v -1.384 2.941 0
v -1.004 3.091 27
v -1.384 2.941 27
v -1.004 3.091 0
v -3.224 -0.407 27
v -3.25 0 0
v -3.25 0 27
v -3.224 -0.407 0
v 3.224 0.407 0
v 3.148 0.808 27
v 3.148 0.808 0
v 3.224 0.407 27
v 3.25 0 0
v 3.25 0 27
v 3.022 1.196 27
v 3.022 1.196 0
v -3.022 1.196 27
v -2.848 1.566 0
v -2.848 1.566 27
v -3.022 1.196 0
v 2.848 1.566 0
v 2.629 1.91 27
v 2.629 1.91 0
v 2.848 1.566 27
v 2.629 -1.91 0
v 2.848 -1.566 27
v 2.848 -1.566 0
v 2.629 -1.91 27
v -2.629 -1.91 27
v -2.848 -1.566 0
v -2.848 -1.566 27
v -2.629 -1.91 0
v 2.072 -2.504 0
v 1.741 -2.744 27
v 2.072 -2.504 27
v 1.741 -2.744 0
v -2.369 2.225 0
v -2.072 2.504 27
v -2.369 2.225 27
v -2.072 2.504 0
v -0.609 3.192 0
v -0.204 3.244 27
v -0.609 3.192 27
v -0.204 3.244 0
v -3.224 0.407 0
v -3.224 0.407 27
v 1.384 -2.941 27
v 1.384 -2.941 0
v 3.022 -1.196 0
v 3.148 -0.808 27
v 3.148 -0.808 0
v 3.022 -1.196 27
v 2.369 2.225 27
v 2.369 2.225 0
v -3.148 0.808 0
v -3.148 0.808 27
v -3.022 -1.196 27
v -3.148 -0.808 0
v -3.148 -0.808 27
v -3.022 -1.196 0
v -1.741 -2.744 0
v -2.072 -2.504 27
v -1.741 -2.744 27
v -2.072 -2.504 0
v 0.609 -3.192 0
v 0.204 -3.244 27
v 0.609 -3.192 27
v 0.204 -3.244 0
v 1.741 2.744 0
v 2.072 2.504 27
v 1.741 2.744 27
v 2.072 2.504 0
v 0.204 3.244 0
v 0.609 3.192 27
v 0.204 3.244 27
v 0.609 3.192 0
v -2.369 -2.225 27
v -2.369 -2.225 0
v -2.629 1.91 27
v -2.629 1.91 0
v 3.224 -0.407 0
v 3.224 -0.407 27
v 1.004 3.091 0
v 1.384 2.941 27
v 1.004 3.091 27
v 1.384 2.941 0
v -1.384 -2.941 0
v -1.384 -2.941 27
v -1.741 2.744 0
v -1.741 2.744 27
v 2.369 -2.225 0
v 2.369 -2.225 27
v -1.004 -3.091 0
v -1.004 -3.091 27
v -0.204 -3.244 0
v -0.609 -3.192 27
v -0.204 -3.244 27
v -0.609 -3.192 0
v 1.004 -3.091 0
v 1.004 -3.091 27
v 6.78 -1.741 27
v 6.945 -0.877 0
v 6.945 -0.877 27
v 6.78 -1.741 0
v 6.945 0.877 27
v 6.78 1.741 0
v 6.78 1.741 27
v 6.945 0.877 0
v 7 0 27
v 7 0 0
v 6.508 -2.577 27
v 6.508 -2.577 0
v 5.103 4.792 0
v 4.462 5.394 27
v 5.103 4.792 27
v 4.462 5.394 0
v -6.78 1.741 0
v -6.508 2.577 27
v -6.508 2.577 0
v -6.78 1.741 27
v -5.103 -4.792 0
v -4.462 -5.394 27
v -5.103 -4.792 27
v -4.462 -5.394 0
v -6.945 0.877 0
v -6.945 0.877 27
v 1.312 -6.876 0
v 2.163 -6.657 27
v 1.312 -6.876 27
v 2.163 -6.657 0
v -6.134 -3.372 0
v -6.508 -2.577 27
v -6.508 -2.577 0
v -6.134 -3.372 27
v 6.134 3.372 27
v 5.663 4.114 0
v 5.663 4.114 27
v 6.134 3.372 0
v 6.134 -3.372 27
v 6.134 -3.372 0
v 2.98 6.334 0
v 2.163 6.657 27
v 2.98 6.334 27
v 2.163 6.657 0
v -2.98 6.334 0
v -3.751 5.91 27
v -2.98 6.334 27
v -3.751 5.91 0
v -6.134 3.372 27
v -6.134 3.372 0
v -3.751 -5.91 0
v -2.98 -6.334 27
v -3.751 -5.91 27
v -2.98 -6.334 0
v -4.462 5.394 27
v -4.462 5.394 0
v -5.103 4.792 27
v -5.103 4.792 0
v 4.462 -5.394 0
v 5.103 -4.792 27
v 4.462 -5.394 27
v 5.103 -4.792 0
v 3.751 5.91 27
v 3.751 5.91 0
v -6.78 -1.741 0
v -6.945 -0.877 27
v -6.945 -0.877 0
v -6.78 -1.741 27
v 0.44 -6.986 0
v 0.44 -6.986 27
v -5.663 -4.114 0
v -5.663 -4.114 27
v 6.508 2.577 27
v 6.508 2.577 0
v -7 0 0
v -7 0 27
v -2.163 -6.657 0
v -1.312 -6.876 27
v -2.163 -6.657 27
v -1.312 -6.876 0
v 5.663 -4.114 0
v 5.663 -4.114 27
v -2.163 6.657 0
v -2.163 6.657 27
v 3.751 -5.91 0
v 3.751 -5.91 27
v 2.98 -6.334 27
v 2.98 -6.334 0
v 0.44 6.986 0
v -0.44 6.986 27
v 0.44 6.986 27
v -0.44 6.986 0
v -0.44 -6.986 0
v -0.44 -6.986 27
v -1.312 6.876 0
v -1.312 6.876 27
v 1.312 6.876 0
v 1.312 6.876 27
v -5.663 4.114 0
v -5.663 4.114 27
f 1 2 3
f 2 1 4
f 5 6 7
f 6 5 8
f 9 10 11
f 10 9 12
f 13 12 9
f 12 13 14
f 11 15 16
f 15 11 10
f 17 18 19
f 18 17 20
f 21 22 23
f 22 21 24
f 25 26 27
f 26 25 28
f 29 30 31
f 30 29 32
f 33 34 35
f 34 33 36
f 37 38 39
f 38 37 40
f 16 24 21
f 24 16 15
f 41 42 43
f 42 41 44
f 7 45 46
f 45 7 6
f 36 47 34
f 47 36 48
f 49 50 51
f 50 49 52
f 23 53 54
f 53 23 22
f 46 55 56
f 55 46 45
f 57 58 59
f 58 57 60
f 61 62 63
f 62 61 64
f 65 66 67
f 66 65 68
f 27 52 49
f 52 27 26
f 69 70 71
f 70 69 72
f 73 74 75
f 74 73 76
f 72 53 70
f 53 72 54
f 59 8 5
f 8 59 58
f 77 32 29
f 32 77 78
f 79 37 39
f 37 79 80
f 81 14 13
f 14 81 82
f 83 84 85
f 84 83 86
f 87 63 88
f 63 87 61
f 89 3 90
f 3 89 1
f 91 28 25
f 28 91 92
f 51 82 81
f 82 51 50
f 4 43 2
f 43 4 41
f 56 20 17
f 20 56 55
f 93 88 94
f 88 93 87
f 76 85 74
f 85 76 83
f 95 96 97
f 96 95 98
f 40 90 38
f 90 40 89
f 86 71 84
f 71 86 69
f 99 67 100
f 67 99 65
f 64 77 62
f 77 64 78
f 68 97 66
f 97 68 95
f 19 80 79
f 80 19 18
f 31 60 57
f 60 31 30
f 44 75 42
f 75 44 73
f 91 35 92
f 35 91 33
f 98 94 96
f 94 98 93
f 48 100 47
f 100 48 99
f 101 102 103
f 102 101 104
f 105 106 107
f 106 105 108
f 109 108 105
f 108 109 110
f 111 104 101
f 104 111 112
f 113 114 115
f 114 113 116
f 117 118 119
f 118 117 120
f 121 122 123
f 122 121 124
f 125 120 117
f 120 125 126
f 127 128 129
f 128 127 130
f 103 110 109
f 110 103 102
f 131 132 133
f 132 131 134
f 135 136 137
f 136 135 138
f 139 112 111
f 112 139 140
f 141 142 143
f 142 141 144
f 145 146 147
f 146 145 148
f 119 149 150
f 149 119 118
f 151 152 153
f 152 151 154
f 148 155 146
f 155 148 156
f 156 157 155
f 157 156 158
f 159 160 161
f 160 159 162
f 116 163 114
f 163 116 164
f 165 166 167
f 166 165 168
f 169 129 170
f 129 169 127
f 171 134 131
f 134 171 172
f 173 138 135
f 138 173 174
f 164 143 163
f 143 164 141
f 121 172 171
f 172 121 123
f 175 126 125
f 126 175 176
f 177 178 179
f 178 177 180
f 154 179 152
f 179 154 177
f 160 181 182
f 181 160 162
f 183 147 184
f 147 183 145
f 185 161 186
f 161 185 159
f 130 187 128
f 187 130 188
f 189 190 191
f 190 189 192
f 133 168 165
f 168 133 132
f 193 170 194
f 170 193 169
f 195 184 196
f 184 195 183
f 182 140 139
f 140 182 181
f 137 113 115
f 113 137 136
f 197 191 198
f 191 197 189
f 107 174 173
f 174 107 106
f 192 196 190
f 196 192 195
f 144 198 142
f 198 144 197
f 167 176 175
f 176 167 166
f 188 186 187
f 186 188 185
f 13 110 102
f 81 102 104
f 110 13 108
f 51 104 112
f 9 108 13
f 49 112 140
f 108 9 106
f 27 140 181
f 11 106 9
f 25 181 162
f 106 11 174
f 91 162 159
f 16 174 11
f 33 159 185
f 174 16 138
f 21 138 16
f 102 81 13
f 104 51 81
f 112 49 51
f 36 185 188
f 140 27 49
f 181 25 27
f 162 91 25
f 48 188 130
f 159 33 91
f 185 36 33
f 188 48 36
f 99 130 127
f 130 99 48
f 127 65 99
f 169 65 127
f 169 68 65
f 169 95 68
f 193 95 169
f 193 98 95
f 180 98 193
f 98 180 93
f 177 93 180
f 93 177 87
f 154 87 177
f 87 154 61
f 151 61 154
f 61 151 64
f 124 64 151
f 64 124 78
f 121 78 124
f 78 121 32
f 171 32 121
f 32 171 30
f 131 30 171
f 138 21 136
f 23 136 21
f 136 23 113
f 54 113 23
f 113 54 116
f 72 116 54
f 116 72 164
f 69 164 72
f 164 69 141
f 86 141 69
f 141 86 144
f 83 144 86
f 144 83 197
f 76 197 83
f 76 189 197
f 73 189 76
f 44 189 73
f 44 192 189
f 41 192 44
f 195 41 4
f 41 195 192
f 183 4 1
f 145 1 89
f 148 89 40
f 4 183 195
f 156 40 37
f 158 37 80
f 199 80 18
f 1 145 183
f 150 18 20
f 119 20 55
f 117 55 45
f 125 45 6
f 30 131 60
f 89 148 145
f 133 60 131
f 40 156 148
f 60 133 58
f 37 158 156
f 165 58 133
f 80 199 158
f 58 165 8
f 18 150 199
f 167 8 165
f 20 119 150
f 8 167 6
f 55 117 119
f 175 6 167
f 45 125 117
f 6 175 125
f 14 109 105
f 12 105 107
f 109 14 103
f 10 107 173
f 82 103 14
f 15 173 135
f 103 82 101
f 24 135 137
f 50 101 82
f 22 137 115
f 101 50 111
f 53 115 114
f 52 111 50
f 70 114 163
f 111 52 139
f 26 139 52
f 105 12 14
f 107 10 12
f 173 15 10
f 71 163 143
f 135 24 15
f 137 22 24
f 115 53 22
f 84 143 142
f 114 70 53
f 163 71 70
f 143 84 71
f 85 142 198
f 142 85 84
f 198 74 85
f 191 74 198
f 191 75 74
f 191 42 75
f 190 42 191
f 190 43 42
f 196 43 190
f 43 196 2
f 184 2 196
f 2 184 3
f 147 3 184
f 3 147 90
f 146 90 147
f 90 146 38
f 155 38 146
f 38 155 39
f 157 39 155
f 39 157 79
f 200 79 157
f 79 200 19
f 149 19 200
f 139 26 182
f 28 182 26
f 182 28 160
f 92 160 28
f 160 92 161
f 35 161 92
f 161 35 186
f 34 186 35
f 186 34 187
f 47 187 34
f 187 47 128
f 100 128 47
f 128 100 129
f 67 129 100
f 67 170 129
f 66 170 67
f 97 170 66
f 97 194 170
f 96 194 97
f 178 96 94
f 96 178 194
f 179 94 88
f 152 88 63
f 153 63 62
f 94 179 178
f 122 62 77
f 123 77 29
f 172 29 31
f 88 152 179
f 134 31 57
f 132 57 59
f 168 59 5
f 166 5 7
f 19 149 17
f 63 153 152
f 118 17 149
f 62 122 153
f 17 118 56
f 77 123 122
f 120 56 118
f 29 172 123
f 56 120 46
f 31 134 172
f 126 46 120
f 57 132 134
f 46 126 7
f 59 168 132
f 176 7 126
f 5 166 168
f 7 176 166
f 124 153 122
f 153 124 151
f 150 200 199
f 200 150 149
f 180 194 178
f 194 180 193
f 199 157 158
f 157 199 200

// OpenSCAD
$fn = 50;


difference() {
	union() {
		cylinder(h = 27, r = 7.0000000000);
	}
	union() {
		translate(v = [0.0000000000, 0.0000000000, -100.0000000000]) {
			cylinder(h = 200, r = 3.2500000000);
		}
		cylinder(h = 27, r = 1.8000000000);
		cylinder(h = 27, r = 1.8000000000);
		cylinder(h = 27, r = 1.8000000000);
	}
}
